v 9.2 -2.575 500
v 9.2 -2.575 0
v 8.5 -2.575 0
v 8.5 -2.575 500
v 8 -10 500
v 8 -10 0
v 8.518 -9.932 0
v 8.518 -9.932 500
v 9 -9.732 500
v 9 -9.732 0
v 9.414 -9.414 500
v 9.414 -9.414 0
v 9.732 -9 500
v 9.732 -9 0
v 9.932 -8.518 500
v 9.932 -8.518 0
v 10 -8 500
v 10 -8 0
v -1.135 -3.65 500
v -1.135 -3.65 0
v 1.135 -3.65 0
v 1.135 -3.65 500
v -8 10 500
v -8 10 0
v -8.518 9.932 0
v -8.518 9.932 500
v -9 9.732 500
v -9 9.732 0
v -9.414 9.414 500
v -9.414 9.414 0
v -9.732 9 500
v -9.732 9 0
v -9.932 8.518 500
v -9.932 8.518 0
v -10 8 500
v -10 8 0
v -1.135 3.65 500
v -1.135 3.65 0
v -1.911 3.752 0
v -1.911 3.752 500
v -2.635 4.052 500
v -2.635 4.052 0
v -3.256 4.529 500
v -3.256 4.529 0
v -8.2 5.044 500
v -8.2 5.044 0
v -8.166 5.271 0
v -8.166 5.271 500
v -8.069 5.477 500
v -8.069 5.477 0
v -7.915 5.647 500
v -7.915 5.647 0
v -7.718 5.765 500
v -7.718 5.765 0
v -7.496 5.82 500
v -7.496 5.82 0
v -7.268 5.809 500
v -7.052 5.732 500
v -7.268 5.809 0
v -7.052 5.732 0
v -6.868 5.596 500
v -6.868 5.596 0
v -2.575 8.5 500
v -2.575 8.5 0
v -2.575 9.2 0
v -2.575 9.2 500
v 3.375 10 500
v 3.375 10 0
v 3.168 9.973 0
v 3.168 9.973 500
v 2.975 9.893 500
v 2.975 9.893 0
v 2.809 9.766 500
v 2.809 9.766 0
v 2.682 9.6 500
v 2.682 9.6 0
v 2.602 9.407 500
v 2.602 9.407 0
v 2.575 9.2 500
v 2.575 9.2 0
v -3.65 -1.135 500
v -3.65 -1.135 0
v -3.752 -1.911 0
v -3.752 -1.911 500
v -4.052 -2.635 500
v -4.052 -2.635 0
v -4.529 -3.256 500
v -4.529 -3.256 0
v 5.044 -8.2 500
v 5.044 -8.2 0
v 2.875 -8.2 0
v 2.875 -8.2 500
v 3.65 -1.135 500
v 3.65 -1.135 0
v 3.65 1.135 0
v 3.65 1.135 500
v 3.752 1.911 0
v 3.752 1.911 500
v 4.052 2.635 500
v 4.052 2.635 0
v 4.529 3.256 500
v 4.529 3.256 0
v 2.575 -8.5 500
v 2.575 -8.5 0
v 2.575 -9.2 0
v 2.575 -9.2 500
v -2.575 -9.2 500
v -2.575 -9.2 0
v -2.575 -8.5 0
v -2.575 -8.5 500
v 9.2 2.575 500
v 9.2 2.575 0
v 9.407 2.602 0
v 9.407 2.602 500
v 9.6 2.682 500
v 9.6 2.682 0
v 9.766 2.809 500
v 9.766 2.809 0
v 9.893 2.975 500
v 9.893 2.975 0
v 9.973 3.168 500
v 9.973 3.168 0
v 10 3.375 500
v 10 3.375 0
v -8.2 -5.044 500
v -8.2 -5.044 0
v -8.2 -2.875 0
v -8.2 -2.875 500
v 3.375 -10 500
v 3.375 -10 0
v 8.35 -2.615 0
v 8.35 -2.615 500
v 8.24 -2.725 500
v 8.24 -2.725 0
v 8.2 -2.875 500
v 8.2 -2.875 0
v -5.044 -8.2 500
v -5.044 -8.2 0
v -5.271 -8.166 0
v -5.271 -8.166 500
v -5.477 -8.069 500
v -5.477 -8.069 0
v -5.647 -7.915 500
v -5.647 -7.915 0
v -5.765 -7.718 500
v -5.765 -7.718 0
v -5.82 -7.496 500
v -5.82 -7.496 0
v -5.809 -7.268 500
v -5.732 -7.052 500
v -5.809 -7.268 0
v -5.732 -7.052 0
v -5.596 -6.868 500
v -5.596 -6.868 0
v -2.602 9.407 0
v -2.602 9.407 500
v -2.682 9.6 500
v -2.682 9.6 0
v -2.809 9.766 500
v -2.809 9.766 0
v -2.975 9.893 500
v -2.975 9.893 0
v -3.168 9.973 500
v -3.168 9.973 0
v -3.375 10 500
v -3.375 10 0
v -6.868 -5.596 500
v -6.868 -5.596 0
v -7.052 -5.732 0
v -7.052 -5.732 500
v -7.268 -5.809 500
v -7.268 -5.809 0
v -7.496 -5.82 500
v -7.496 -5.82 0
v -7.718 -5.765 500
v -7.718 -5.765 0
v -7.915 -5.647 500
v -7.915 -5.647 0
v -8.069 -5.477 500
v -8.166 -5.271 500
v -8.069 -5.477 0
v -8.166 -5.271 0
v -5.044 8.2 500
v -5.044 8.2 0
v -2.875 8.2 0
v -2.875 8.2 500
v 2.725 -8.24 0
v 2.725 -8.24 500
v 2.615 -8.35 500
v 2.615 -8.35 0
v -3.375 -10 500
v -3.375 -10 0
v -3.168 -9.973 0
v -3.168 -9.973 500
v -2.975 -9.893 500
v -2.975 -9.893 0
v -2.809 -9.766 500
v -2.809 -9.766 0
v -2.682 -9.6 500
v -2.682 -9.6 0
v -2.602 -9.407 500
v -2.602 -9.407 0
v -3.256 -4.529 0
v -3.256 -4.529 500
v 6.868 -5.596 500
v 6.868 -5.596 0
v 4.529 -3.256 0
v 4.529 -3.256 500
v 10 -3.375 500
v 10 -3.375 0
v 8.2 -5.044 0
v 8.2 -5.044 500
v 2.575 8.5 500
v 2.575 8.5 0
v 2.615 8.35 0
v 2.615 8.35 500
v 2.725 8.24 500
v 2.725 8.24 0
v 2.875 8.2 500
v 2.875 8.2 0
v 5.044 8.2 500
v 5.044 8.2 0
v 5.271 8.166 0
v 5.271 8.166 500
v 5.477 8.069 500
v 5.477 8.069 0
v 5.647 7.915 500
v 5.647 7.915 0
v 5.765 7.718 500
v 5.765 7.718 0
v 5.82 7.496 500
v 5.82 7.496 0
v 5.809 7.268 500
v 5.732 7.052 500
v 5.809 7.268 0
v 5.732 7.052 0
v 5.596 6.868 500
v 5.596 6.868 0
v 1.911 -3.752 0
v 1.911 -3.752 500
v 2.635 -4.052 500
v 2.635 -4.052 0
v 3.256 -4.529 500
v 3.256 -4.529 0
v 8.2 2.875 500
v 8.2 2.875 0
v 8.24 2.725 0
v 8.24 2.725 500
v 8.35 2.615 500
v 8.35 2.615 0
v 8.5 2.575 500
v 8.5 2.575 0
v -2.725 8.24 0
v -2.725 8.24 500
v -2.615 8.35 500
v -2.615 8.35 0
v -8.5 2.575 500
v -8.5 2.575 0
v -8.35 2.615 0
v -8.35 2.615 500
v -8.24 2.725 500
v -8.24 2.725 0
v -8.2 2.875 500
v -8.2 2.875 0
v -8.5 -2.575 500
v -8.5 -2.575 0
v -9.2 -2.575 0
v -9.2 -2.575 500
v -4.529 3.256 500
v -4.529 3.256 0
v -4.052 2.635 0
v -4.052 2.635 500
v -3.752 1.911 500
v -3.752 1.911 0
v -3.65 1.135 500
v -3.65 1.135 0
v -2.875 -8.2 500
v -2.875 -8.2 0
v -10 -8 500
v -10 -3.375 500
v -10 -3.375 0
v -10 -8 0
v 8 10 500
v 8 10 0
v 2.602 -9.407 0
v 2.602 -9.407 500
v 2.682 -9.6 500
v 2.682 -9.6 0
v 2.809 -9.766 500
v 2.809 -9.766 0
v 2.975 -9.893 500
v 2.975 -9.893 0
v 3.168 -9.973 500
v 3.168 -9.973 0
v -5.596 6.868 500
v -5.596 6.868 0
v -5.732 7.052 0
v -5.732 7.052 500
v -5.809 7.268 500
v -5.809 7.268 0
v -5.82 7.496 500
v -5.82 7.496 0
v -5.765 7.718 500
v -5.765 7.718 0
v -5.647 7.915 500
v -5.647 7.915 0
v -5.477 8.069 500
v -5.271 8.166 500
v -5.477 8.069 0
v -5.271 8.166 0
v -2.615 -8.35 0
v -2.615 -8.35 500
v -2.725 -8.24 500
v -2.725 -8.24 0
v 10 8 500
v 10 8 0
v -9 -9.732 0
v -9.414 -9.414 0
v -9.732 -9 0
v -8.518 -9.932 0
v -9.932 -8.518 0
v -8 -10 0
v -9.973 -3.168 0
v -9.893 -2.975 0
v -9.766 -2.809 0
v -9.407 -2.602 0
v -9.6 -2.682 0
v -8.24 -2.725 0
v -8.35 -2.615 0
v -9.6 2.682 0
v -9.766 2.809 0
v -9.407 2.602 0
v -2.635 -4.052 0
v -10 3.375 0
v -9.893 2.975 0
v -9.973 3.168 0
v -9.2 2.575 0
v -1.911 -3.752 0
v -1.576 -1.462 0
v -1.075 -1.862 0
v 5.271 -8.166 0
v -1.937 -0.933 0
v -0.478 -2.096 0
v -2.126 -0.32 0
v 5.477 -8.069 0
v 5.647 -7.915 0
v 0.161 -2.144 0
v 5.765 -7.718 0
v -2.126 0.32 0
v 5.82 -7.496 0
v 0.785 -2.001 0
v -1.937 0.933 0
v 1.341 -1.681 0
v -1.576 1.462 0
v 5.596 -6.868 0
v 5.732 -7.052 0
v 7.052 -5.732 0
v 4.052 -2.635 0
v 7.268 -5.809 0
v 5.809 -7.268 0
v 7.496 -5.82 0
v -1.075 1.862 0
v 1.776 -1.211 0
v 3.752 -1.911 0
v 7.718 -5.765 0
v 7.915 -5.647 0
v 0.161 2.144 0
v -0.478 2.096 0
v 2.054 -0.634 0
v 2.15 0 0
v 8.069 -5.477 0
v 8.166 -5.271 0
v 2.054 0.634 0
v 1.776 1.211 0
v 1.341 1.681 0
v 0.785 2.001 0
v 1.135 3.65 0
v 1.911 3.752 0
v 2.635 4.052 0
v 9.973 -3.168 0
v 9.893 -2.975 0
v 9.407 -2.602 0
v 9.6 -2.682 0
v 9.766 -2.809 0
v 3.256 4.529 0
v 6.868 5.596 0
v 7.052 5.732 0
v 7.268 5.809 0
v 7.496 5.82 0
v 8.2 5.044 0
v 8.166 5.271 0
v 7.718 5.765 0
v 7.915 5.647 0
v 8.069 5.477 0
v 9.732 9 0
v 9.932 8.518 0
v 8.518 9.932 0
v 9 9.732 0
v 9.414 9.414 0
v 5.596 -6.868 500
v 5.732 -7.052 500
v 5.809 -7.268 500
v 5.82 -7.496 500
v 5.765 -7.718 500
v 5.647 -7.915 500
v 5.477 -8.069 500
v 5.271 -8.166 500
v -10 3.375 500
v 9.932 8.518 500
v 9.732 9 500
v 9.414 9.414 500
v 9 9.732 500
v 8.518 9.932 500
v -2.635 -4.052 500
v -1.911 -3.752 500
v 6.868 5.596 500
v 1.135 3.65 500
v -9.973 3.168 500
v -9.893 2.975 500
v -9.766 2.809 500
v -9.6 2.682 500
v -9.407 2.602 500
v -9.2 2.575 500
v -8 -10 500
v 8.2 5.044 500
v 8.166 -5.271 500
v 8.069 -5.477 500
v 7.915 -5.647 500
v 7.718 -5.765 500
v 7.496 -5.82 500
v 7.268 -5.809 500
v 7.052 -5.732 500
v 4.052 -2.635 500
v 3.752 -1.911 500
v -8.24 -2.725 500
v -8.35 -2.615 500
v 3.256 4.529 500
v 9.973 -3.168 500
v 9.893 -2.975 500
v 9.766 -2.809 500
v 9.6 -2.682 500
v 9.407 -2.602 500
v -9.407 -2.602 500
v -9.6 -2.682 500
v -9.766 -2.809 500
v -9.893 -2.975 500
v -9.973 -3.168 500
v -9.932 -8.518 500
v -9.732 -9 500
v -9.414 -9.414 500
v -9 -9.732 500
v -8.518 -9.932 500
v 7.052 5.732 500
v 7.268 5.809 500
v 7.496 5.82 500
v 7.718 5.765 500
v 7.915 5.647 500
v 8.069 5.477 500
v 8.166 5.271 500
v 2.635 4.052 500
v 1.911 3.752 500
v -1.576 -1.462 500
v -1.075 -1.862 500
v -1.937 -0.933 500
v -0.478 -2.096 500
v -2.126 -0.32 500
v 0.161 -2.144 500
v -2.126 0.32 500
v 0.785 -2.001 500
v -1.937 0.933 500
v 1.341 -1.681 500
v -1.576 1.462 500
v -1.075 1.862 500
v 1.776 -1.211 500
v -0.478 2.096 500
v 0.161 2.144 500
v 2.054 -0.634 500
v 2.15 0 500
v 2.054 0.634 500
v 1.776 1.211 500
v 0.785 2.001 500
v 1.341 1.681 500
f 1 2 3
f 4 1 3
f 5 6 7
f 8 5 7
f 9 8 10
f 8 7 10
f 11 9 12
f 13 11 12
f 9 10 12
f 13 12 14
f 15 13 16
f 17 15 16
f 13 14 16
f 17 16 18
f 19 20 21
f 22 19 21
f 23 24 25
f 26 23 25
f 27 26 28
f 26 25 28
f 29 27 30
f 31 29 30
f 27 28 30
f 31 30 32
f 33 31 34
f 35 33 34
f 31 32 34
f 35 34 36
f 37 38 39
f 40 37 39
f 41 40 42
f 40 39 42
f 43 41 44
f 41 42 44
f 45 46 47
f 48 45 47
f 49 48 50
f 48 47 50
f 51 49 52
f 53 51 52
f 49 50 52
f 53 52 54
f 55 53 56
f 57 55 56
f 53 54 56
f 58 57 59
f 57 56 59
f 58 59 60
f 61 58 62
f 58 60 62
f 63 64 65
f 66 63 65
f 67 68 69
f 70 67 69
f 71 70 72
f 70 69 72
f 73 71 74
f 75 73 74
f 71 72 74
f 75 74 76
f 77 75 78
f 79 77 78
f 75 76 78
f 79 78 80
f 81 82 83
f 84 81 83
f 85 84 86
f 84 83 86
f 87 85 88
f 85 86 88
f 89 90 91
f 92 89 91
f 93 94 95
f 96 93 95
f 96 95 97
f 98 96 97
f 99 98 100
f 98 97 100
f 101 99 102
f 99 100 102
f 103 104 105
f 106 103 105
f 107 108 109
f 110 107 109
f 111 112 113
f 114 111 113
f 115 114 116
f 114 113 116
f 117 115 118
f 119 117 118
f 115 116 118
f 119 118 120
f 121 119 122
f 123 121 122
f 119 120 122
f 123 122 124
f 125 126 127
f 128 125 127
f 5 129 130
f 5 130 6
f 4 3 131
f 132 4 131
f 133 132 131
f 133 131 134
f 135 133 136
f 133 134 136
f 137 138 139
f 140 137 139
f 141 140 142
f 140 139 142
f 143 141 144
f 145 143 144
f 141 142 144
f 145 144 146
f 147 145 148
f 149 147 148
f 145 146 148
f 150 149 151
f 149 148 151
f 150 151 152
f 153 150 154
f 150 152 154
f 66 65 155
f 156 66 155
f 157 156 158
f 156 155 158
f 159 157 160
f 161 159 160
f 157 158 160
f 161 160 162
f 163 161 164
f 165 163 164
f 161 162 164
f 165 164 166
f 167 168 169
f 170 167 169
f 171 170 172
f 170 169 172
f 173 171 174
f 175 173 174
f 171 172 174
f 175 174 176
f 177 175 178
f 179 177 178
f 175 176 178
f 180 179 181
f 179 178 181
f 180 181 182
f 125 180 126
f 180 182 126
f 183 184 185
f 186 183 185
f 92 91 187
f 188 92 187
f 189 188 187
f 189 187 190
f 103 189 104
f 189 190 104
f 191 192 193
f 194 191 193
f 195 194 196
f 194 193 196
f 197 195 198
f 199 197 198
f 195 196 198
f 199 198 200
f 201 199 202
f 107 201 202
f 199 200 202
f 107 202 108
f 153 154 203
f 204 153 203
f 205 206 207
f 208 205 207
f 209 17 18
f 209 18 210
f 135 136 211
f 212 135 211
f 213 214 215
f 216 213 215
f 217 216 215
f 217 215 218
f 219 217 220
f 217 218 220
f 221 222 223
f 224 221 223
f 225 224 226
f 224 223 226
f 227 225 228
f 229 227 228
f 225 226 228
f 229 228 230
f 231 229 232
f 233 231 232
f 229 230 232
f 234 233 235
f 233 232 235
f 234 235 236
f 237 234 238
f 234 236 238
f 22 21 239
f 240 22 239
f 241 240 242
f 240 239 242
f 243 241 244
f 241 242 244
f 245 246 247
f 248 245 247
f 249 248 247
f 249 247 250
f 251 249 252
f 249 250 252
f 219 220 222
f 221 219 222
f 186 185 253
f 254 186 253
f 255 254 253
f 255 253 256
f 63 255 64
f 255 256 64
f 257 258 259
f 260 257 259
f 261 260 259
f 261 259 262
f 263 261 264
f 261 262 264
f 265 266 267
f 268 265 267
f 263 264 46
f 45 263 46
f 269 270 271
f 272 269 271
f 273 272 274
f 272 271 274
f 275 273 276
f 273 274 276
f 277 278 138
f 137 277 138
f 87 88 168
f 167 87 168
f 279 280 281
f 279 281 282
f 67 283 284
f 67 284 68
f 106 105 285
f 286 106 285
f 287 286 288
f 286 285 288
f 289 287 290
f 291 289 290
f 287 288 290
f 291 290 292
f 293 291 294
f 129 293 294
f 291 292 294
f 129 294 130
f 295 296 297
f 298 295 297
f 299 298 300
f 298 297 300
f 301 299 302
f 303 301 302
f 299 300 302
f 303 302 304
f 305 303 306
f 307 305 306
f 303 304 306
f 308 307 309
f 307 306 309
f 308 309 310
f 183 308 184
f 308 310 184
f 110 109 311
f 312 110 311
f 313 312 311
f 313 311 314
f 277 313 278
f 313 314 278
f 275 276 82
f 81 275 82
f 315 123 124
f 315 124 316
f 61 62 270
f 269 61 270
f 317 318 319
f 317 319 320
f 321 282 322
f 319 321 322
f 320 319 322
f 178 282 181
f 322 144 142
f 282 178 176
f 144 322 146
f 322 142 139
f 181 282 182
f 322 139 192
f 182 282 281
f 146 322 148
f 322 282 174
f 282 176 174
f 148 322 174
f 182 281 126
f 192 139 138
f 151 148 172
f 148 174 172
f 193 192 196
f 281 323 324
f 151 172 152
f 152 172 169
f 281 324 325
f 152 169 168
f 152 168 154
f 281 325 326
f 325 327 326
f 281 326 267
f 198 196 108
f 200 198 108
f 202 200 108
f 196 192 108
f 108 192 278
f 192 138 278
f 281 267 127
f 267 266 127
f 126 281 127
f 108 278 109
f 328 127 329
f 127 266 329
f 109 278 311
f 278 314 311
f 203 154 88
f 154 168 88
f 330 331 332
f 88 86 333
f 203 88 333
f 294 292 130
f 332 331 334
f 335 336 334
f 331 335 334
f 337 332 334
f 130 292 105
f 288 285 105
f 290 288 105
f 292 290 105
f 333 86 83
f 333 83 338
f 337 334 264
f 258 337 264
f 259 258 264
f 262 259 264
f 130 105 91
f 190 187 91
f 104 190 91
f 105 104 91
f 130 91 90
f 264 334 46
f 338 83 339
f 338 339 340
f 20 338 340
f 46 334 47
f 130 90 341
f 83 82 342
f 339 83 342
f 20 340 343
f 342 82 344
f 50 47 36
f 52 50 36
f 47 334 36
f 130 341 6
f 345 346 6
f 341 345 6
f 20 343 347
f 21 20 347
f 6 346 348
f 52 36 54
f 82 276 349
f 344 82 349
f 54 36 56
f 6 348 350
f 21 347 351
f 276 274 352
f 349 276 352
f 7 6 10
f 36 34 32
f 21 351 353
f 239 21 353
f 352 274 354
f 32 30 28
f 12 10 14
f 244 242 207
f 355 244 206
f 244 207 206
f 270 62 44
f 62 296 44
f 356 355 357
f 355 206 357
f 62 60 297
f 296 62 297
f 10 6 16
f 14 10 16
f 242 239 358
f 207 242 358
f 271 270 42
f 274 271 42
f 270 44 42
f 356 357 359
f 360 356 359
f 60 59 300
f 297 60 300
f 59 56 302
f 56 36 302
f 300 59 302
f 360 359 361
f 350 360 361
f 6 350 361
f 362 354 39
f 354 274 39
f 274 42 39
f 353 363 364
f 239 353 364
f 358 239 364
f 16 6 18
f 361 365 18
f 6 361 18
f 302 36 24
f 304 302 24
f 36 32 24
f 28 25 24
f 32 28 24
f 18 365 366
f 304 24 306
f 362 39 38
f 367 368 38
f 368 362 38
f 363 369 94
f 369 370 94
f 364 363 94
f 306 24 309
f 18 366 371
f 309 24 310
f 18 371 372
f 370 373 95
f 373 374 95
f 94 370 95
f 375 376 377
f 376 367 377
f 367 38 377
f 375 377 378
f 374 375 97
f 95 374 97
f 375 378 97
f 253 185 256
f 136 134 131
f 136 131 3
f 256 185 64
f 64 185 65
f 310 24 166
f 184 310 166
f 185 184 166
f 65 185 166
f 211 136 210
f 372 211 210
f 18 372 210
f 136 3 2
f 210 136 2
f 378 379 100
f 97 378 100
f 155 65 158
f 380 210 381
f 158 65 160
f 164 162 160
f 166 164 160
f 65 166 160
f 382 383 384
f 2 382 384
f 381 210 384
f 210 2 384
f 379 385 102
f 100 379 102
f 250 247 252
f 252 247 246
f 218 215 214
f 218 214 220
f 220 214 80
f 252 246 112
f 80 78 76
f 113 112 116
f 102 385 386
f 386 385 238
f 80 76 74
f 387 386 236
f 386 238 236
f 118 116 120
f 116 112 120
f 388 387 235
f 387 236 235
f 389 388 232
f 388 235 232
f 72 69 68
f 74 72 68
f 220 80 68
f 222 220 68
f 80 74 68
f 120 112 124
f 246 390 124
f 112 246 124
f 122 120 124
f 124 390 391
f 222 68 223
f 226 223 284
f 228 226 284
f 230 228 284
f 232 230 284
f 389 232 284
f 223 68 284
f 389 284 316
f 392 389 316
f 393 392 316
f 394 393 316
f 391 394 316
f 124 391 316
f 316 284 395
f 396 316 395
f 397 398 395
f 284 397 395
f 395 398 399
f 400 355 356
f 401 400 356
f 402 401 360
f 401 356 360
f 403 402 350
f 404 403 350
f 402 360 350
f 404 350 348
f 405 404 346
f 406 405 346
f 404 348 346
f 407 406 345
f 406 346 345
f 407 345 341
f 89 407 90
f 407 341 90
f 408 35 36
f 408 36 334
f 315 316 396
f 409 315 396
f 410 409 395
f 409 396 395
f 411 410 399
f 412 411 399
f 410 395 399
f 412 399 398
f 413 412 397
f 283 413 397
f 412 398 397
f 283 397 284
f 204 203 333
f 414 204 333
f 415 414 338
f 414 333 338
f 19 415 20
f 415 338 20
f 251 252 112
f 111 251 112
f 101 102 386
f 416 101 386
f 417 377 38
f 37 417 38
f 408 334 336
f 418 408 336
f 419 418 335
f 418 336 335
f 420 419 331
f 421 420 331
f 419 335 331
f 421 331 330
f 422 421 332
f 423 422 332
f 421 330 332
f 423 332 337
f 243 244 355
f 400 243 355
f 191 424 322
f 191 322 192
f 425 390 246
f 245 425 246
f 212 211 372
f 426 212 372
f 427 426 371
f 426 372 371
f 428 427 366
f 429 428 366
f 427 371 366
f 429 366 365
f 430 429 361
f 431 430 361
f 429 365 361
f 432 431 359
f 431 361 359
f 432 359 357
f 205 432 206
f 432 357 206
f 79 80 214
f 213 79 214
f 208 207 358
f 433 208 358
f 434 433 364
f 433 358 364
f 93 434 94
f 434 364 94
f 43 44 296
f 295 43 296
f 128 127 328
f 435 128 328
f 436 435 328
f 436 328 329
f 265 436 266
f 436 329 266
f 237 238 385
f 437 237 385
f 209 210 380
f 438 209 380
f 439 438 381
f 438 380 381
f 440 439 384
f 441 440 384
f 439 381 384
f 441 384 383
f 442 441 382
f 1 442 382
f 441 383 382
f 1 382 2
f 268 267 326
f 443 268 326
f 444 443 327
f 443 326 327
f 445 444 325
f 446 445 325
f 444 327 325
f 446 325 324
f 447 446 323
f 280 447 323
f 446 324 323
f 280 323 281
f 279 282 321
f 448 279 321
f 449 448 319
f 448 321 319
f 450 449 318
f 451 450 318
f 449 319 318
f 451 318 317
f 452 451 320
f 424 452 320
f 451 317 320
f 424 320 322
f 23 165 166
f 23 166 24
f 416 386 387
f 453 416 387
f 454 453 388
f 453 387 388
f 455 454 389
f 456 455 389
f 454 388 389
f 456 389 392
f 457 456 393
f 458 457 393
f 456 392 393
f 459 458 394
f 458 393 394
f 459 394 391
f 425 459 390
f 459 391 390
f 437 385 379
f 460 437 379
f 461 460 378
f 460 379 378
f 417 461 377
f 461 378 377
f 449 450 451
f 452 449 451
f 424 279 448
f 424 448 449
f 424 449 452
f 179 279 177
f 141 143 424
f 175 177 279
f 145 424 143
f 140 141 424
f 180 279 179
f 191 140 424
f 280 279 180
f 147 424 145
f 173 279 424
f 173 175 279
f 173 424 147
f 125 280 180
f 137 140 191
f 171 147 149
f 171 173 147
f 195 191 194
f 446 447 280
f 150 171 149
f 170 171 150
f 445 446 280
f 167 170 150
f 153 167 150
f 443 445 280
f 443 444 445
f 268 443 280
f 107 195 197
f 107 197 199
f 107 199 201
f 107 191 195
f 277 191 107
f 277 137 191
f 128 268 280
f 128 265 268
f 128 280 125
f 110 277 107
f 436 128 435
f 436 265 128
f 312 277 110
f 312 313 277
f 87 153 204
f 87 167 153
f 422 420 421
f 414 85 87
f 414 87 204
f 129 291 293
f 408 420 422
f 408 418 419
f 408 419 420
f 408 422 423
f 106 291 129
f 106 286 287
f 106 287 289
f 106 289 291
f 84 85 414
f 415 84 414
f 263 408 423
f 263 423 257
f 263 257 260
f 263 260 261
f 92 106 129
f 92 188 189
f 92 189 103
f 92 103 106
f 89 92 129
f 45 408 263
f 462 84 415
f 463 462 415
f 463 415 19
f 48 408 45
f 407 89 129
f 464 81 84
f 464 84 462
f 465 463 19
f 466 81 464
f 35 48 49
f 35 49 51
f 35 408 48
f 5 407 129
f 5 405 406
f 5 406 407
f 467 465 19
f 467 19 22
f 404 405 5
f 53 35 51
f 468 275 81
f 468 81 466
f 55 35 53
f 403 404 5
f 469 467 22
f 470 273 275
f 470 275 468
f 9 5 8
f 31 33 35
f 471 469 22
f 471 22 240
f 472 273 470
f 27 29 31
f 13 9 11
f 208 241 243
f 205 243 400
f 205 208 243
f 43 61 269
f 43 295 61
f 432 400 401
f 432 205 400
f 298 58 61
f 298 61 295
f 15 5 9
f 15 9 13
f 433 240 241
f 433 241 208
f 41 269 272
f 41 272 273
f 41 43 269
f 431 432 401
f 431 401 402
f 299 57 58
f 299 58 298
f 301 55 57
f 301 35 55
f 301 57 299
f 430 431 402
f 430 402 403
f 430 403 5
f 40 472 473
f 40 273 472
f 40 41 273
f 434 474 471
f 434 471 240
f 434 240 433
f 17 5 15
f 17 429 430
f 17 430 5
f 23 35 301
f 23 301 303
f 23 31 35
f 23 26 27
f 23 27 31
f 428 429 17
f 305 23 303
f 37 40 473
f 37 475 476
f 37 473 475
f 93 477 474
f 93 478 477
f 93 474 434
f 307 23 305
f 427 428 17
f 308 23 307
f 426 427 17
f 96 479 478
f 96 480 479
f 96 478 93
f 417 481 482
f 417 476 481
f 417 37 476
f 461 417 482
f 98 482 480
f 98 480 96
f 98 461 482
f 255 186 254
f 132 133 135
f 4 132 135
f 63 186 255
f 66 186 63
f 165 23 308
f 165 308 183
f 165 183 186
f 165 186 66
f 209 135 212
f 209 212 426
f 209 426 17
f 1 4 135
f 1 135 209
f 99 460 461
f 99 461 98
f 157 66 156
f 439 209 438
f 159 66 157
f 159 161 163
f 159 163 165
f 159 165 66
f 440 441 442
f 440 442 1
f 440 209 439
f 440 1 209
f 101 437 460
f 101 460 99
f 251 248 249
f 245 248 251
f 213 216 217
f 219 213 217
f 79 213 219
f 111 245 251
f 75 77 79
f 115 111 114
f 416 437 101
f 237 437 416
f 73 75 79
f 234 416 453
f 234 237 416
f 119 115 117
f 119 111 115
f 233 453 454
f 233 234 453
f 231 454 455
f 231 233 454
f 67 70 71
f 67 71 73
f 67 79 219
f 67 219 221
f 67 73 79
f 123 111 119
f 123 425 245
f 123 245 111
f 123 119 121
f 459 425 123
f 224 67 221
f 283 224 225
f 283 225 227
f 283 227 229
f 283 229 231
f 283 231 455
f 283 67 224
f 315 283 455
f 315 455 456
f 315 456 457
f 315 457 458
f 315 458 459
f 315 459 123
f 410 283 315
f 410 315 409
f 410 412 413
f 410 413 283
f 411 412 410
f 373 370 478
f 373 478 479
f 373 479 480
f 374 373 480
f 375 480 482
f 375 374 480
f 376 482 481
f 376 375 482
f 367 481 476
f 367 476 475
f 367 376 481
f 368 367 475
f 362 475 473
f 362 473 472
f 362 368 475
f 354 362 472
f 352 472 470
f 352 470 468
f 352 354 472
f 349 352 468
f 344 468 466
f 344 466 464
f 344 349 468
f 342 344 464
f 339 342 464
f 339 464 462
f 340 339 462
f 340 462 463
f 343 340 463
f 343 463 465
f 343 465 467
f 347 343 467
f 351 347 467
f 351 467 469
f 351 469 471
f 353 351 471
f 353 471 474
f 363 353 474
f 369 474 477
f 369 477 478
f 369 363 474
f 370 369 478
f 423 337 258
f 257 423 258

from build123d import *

# Parameters (mm, degrees)
F1_DEPTH = 500
F2_R     = 2.15
F3_DEPTH = 500


with BuildPart() as f1:
    # F0 (on Top) → F1 (new body)
    with BuildSketch(Plane.XY):
        with BuildLine():
            ThreePointArc((4.52868, -3.255887), (3.878361, -2.282617), (3.65, -1.134567))
            Line((3.65, -1.134567), (3.65, 1.134567))
            ThreePointArc((3.65, 1.134567), (3.878361, 2.282617), (4.52868, 3.255887))
            Line((4.52868, 3.255887), (6.868457, 5.595664))
            ThreePointArc((6.868457, 5.595664), (7.718493, 5.764747), (8.2, 5.044121))
            Line((8.2, 5.044121), (8.200001, 2.875))
            ThreePointArc((8.200001, 2.875), (8.287869, 2.662868), (8.500001, 2.575))
            Line((8.500001, 2.575), (9.2, 2.575))
            ThreePointArc((9.2, 2.575), (9.765685, 2.809315), (10, 3.375))
            Line((10, 3.375), (10, 8))
            ThreePointArc((10, 8), (9.414214, 9.414214), (8, 10))
            Line((8, 10), (3.375, 10))
            ThreePointArc((3.375, 10), (2.809315, 9.765685), (2.575, 9.2))
            Line((2.575, 9.2), (2.575, 8.500001))
            ThreePointArc((2.575, 8.500001), (2.662868, 8.287869), (2.875, 8.200001))
            Line((2.875, 8.200001), (5.044121, 8.2))
            ThreePointArc((5.044121, 8.2), (5.764747, 7.718493), (5.595664, 6.868457))
            Line((5.595664, 6.868457), (3.255887, 4.52868))
            ThreePointArc((3.255887, 4.52868), (2.282617, 3.878361), (1.134567, 3.65))
            Line((1.134567, 3.65), (-1.134567, 3.65))
            ThreePointArc((-1.134567, 3.65), (-2.282617, 3.878361), (-3.255887, 4.52868))
            Line((-3.255887, 4.52868), (-5.595664, 6.868457))
            ThreePointArc((-5.595664, 6.868457), (-5.764747, 7.718493), (-5.044121, 8.2))
            Line((-5.044121, 8.2), (-2.875, 8.200001))
            ThreePointArc((-2.875, 8.200001), (-2.662868, 8.287869), (-2.575, 8.500001))
            Line((-2.575, 8.500001), (-2.575, 9.2))
            ThreePointArc((-2.575, 9.2), (-2.809315, 9.765685), (-3.375, 10))
            Line((-3.375, 10), (-8, 10))
            ThreePointArc((-8, 10), (-9.414214, 9.414214), (-10, 8))
            Line((-10, 8), (-10, 3.375))
            ThreePointArc((-10, 3.375), (-9.765685, 2.809315), (-9.2, 2.575))
            Line((-9.2, 2.575), (-8.500001, 2.575))
            ThreePointArc((-8.500001, 2.575), (-8.287869, 2.662868), (-8.200001, 2.875))
            Line((-8.200001, 2.875), (-8.2, 5.044121))
            ThreePointArc((-8.2, 5.044121), (-7.718493, 5.764747), (-6.868457, 5.595664))
            Line((-6.868457, 5.595664), (-4.52868, 3.255887))
            ThreePointArc((-4.52868, 3.255887), (-3.878361, 2.282617), (-3.65, 1.134567))
            Line((-3.65, 1.134567), (-3.65, -1.134567))
            ThreePointArc((-3.65, -1.134567), (-3.878361, -2.282617), (-4.52868, -3.255887))
            Line((-4.52868, -3.255887), (-6.868457, -5.595664))
            ThreePointArc((-6.868457, -5.595664), (-7.718493, -5.764747), (-8.2, -5.044121))
            Line((-8.2, -5.044121), (-8.200001, -2.875))
            ThreePointArc((-8.200001, -2.875), (-8.287869, -2.662868), (-8.500001, -2.575))
            Line((-8.500001, -2.575), (-9.2, -2.575))
            ThreePointArc((-9.2, -2.575), (-9.765685, -2.809315), (-10, -3.375))
            Line((-10, -3.375), (-10, -8))
            ThreePointArc((-10, -8), (-9.414214, -9.414214), (-8, -10))
            Line((-8, -10), (-3.375, -10))
            ThreePointArc((-3.375, -10), (-2.809315, -9.765685), (-2.575, -9.2))
            Line((-2.575, -9.2), (-2.575, -8.500001))
            ThreePointArc((-2.575, -8.500001), (-2.662868, -8.287869), (-2.875, -8.200001))
            Line((-2.875, -8.200001), (-5.044121, -8.2))
            ThreePointArc((-5.044121, -8.2), (-5.764747, -7.718493), (-5.595664, -6.868457))
            Line((-5.595664, -6.868457), (-3.255887, -4.52868))
            ThreePointArc((-3.255887, -4.52868), (-2.282617, -3.878361), (-1.134567, -3.65))
            Line((-1.134567, -3.65), (1.134567, -3.65))
            ThreePointArc((1.134567, -3.65), (2.282617, -3.878361), (3.255887, -4.52868))
            Line((3.255887, -4.52868), (5.595664, -6.868457))
            ThreePointArc((5.595664, -6.868457), (5.764747, -7.718493), (5.044121, -8.2))
            Line((5.044121, -8.2), (2.875, -8.200001))
            ThreePointArc((2.875, -8.200001), (2.662868, -8.287869), (2.575, -8.500001))
            Line((2.575, -8.500001), (2.575, -9.2))
            ThreePointArc((2.575, -9.2), (2.809315, -9.765685), (3.375, -10))
            Line((3.375, -10), (8, -10))
            ThreePointArc((8, -10), (9.414214, -9.414214), (10, -8))
            Line((10, -8), (10, -3.375))
            ThreePointArc((10, -3.375), (9.765685, -2.809315), (9.2, -2.575))
            Line((9.2, -2.575), (8.500001, -2.575))
            ThreePointArc((8.500001, -2.575), (8.287869, -2.662868), (8.200001, -2.875))
            Line((8.200001, -2.875), (8.2, -5.044121))
            ThreePointArc((8.2, -5.044121), (7.718493, -5.764747), (6.868457, -5.595664))
            Line((6.868457, -5.595664), (4.52868, -3.255887))
        make_face()
    extrude(amount=F1_DEPTH)

    # F2 (on Top) → F3 (cut, through all)
    with BuildSketch(Plane.XY):
        Circle(F2_R)
    extrude(amount=F3_DEPTH, mode=Mode.SUBTRACT)


solid = f1.part
